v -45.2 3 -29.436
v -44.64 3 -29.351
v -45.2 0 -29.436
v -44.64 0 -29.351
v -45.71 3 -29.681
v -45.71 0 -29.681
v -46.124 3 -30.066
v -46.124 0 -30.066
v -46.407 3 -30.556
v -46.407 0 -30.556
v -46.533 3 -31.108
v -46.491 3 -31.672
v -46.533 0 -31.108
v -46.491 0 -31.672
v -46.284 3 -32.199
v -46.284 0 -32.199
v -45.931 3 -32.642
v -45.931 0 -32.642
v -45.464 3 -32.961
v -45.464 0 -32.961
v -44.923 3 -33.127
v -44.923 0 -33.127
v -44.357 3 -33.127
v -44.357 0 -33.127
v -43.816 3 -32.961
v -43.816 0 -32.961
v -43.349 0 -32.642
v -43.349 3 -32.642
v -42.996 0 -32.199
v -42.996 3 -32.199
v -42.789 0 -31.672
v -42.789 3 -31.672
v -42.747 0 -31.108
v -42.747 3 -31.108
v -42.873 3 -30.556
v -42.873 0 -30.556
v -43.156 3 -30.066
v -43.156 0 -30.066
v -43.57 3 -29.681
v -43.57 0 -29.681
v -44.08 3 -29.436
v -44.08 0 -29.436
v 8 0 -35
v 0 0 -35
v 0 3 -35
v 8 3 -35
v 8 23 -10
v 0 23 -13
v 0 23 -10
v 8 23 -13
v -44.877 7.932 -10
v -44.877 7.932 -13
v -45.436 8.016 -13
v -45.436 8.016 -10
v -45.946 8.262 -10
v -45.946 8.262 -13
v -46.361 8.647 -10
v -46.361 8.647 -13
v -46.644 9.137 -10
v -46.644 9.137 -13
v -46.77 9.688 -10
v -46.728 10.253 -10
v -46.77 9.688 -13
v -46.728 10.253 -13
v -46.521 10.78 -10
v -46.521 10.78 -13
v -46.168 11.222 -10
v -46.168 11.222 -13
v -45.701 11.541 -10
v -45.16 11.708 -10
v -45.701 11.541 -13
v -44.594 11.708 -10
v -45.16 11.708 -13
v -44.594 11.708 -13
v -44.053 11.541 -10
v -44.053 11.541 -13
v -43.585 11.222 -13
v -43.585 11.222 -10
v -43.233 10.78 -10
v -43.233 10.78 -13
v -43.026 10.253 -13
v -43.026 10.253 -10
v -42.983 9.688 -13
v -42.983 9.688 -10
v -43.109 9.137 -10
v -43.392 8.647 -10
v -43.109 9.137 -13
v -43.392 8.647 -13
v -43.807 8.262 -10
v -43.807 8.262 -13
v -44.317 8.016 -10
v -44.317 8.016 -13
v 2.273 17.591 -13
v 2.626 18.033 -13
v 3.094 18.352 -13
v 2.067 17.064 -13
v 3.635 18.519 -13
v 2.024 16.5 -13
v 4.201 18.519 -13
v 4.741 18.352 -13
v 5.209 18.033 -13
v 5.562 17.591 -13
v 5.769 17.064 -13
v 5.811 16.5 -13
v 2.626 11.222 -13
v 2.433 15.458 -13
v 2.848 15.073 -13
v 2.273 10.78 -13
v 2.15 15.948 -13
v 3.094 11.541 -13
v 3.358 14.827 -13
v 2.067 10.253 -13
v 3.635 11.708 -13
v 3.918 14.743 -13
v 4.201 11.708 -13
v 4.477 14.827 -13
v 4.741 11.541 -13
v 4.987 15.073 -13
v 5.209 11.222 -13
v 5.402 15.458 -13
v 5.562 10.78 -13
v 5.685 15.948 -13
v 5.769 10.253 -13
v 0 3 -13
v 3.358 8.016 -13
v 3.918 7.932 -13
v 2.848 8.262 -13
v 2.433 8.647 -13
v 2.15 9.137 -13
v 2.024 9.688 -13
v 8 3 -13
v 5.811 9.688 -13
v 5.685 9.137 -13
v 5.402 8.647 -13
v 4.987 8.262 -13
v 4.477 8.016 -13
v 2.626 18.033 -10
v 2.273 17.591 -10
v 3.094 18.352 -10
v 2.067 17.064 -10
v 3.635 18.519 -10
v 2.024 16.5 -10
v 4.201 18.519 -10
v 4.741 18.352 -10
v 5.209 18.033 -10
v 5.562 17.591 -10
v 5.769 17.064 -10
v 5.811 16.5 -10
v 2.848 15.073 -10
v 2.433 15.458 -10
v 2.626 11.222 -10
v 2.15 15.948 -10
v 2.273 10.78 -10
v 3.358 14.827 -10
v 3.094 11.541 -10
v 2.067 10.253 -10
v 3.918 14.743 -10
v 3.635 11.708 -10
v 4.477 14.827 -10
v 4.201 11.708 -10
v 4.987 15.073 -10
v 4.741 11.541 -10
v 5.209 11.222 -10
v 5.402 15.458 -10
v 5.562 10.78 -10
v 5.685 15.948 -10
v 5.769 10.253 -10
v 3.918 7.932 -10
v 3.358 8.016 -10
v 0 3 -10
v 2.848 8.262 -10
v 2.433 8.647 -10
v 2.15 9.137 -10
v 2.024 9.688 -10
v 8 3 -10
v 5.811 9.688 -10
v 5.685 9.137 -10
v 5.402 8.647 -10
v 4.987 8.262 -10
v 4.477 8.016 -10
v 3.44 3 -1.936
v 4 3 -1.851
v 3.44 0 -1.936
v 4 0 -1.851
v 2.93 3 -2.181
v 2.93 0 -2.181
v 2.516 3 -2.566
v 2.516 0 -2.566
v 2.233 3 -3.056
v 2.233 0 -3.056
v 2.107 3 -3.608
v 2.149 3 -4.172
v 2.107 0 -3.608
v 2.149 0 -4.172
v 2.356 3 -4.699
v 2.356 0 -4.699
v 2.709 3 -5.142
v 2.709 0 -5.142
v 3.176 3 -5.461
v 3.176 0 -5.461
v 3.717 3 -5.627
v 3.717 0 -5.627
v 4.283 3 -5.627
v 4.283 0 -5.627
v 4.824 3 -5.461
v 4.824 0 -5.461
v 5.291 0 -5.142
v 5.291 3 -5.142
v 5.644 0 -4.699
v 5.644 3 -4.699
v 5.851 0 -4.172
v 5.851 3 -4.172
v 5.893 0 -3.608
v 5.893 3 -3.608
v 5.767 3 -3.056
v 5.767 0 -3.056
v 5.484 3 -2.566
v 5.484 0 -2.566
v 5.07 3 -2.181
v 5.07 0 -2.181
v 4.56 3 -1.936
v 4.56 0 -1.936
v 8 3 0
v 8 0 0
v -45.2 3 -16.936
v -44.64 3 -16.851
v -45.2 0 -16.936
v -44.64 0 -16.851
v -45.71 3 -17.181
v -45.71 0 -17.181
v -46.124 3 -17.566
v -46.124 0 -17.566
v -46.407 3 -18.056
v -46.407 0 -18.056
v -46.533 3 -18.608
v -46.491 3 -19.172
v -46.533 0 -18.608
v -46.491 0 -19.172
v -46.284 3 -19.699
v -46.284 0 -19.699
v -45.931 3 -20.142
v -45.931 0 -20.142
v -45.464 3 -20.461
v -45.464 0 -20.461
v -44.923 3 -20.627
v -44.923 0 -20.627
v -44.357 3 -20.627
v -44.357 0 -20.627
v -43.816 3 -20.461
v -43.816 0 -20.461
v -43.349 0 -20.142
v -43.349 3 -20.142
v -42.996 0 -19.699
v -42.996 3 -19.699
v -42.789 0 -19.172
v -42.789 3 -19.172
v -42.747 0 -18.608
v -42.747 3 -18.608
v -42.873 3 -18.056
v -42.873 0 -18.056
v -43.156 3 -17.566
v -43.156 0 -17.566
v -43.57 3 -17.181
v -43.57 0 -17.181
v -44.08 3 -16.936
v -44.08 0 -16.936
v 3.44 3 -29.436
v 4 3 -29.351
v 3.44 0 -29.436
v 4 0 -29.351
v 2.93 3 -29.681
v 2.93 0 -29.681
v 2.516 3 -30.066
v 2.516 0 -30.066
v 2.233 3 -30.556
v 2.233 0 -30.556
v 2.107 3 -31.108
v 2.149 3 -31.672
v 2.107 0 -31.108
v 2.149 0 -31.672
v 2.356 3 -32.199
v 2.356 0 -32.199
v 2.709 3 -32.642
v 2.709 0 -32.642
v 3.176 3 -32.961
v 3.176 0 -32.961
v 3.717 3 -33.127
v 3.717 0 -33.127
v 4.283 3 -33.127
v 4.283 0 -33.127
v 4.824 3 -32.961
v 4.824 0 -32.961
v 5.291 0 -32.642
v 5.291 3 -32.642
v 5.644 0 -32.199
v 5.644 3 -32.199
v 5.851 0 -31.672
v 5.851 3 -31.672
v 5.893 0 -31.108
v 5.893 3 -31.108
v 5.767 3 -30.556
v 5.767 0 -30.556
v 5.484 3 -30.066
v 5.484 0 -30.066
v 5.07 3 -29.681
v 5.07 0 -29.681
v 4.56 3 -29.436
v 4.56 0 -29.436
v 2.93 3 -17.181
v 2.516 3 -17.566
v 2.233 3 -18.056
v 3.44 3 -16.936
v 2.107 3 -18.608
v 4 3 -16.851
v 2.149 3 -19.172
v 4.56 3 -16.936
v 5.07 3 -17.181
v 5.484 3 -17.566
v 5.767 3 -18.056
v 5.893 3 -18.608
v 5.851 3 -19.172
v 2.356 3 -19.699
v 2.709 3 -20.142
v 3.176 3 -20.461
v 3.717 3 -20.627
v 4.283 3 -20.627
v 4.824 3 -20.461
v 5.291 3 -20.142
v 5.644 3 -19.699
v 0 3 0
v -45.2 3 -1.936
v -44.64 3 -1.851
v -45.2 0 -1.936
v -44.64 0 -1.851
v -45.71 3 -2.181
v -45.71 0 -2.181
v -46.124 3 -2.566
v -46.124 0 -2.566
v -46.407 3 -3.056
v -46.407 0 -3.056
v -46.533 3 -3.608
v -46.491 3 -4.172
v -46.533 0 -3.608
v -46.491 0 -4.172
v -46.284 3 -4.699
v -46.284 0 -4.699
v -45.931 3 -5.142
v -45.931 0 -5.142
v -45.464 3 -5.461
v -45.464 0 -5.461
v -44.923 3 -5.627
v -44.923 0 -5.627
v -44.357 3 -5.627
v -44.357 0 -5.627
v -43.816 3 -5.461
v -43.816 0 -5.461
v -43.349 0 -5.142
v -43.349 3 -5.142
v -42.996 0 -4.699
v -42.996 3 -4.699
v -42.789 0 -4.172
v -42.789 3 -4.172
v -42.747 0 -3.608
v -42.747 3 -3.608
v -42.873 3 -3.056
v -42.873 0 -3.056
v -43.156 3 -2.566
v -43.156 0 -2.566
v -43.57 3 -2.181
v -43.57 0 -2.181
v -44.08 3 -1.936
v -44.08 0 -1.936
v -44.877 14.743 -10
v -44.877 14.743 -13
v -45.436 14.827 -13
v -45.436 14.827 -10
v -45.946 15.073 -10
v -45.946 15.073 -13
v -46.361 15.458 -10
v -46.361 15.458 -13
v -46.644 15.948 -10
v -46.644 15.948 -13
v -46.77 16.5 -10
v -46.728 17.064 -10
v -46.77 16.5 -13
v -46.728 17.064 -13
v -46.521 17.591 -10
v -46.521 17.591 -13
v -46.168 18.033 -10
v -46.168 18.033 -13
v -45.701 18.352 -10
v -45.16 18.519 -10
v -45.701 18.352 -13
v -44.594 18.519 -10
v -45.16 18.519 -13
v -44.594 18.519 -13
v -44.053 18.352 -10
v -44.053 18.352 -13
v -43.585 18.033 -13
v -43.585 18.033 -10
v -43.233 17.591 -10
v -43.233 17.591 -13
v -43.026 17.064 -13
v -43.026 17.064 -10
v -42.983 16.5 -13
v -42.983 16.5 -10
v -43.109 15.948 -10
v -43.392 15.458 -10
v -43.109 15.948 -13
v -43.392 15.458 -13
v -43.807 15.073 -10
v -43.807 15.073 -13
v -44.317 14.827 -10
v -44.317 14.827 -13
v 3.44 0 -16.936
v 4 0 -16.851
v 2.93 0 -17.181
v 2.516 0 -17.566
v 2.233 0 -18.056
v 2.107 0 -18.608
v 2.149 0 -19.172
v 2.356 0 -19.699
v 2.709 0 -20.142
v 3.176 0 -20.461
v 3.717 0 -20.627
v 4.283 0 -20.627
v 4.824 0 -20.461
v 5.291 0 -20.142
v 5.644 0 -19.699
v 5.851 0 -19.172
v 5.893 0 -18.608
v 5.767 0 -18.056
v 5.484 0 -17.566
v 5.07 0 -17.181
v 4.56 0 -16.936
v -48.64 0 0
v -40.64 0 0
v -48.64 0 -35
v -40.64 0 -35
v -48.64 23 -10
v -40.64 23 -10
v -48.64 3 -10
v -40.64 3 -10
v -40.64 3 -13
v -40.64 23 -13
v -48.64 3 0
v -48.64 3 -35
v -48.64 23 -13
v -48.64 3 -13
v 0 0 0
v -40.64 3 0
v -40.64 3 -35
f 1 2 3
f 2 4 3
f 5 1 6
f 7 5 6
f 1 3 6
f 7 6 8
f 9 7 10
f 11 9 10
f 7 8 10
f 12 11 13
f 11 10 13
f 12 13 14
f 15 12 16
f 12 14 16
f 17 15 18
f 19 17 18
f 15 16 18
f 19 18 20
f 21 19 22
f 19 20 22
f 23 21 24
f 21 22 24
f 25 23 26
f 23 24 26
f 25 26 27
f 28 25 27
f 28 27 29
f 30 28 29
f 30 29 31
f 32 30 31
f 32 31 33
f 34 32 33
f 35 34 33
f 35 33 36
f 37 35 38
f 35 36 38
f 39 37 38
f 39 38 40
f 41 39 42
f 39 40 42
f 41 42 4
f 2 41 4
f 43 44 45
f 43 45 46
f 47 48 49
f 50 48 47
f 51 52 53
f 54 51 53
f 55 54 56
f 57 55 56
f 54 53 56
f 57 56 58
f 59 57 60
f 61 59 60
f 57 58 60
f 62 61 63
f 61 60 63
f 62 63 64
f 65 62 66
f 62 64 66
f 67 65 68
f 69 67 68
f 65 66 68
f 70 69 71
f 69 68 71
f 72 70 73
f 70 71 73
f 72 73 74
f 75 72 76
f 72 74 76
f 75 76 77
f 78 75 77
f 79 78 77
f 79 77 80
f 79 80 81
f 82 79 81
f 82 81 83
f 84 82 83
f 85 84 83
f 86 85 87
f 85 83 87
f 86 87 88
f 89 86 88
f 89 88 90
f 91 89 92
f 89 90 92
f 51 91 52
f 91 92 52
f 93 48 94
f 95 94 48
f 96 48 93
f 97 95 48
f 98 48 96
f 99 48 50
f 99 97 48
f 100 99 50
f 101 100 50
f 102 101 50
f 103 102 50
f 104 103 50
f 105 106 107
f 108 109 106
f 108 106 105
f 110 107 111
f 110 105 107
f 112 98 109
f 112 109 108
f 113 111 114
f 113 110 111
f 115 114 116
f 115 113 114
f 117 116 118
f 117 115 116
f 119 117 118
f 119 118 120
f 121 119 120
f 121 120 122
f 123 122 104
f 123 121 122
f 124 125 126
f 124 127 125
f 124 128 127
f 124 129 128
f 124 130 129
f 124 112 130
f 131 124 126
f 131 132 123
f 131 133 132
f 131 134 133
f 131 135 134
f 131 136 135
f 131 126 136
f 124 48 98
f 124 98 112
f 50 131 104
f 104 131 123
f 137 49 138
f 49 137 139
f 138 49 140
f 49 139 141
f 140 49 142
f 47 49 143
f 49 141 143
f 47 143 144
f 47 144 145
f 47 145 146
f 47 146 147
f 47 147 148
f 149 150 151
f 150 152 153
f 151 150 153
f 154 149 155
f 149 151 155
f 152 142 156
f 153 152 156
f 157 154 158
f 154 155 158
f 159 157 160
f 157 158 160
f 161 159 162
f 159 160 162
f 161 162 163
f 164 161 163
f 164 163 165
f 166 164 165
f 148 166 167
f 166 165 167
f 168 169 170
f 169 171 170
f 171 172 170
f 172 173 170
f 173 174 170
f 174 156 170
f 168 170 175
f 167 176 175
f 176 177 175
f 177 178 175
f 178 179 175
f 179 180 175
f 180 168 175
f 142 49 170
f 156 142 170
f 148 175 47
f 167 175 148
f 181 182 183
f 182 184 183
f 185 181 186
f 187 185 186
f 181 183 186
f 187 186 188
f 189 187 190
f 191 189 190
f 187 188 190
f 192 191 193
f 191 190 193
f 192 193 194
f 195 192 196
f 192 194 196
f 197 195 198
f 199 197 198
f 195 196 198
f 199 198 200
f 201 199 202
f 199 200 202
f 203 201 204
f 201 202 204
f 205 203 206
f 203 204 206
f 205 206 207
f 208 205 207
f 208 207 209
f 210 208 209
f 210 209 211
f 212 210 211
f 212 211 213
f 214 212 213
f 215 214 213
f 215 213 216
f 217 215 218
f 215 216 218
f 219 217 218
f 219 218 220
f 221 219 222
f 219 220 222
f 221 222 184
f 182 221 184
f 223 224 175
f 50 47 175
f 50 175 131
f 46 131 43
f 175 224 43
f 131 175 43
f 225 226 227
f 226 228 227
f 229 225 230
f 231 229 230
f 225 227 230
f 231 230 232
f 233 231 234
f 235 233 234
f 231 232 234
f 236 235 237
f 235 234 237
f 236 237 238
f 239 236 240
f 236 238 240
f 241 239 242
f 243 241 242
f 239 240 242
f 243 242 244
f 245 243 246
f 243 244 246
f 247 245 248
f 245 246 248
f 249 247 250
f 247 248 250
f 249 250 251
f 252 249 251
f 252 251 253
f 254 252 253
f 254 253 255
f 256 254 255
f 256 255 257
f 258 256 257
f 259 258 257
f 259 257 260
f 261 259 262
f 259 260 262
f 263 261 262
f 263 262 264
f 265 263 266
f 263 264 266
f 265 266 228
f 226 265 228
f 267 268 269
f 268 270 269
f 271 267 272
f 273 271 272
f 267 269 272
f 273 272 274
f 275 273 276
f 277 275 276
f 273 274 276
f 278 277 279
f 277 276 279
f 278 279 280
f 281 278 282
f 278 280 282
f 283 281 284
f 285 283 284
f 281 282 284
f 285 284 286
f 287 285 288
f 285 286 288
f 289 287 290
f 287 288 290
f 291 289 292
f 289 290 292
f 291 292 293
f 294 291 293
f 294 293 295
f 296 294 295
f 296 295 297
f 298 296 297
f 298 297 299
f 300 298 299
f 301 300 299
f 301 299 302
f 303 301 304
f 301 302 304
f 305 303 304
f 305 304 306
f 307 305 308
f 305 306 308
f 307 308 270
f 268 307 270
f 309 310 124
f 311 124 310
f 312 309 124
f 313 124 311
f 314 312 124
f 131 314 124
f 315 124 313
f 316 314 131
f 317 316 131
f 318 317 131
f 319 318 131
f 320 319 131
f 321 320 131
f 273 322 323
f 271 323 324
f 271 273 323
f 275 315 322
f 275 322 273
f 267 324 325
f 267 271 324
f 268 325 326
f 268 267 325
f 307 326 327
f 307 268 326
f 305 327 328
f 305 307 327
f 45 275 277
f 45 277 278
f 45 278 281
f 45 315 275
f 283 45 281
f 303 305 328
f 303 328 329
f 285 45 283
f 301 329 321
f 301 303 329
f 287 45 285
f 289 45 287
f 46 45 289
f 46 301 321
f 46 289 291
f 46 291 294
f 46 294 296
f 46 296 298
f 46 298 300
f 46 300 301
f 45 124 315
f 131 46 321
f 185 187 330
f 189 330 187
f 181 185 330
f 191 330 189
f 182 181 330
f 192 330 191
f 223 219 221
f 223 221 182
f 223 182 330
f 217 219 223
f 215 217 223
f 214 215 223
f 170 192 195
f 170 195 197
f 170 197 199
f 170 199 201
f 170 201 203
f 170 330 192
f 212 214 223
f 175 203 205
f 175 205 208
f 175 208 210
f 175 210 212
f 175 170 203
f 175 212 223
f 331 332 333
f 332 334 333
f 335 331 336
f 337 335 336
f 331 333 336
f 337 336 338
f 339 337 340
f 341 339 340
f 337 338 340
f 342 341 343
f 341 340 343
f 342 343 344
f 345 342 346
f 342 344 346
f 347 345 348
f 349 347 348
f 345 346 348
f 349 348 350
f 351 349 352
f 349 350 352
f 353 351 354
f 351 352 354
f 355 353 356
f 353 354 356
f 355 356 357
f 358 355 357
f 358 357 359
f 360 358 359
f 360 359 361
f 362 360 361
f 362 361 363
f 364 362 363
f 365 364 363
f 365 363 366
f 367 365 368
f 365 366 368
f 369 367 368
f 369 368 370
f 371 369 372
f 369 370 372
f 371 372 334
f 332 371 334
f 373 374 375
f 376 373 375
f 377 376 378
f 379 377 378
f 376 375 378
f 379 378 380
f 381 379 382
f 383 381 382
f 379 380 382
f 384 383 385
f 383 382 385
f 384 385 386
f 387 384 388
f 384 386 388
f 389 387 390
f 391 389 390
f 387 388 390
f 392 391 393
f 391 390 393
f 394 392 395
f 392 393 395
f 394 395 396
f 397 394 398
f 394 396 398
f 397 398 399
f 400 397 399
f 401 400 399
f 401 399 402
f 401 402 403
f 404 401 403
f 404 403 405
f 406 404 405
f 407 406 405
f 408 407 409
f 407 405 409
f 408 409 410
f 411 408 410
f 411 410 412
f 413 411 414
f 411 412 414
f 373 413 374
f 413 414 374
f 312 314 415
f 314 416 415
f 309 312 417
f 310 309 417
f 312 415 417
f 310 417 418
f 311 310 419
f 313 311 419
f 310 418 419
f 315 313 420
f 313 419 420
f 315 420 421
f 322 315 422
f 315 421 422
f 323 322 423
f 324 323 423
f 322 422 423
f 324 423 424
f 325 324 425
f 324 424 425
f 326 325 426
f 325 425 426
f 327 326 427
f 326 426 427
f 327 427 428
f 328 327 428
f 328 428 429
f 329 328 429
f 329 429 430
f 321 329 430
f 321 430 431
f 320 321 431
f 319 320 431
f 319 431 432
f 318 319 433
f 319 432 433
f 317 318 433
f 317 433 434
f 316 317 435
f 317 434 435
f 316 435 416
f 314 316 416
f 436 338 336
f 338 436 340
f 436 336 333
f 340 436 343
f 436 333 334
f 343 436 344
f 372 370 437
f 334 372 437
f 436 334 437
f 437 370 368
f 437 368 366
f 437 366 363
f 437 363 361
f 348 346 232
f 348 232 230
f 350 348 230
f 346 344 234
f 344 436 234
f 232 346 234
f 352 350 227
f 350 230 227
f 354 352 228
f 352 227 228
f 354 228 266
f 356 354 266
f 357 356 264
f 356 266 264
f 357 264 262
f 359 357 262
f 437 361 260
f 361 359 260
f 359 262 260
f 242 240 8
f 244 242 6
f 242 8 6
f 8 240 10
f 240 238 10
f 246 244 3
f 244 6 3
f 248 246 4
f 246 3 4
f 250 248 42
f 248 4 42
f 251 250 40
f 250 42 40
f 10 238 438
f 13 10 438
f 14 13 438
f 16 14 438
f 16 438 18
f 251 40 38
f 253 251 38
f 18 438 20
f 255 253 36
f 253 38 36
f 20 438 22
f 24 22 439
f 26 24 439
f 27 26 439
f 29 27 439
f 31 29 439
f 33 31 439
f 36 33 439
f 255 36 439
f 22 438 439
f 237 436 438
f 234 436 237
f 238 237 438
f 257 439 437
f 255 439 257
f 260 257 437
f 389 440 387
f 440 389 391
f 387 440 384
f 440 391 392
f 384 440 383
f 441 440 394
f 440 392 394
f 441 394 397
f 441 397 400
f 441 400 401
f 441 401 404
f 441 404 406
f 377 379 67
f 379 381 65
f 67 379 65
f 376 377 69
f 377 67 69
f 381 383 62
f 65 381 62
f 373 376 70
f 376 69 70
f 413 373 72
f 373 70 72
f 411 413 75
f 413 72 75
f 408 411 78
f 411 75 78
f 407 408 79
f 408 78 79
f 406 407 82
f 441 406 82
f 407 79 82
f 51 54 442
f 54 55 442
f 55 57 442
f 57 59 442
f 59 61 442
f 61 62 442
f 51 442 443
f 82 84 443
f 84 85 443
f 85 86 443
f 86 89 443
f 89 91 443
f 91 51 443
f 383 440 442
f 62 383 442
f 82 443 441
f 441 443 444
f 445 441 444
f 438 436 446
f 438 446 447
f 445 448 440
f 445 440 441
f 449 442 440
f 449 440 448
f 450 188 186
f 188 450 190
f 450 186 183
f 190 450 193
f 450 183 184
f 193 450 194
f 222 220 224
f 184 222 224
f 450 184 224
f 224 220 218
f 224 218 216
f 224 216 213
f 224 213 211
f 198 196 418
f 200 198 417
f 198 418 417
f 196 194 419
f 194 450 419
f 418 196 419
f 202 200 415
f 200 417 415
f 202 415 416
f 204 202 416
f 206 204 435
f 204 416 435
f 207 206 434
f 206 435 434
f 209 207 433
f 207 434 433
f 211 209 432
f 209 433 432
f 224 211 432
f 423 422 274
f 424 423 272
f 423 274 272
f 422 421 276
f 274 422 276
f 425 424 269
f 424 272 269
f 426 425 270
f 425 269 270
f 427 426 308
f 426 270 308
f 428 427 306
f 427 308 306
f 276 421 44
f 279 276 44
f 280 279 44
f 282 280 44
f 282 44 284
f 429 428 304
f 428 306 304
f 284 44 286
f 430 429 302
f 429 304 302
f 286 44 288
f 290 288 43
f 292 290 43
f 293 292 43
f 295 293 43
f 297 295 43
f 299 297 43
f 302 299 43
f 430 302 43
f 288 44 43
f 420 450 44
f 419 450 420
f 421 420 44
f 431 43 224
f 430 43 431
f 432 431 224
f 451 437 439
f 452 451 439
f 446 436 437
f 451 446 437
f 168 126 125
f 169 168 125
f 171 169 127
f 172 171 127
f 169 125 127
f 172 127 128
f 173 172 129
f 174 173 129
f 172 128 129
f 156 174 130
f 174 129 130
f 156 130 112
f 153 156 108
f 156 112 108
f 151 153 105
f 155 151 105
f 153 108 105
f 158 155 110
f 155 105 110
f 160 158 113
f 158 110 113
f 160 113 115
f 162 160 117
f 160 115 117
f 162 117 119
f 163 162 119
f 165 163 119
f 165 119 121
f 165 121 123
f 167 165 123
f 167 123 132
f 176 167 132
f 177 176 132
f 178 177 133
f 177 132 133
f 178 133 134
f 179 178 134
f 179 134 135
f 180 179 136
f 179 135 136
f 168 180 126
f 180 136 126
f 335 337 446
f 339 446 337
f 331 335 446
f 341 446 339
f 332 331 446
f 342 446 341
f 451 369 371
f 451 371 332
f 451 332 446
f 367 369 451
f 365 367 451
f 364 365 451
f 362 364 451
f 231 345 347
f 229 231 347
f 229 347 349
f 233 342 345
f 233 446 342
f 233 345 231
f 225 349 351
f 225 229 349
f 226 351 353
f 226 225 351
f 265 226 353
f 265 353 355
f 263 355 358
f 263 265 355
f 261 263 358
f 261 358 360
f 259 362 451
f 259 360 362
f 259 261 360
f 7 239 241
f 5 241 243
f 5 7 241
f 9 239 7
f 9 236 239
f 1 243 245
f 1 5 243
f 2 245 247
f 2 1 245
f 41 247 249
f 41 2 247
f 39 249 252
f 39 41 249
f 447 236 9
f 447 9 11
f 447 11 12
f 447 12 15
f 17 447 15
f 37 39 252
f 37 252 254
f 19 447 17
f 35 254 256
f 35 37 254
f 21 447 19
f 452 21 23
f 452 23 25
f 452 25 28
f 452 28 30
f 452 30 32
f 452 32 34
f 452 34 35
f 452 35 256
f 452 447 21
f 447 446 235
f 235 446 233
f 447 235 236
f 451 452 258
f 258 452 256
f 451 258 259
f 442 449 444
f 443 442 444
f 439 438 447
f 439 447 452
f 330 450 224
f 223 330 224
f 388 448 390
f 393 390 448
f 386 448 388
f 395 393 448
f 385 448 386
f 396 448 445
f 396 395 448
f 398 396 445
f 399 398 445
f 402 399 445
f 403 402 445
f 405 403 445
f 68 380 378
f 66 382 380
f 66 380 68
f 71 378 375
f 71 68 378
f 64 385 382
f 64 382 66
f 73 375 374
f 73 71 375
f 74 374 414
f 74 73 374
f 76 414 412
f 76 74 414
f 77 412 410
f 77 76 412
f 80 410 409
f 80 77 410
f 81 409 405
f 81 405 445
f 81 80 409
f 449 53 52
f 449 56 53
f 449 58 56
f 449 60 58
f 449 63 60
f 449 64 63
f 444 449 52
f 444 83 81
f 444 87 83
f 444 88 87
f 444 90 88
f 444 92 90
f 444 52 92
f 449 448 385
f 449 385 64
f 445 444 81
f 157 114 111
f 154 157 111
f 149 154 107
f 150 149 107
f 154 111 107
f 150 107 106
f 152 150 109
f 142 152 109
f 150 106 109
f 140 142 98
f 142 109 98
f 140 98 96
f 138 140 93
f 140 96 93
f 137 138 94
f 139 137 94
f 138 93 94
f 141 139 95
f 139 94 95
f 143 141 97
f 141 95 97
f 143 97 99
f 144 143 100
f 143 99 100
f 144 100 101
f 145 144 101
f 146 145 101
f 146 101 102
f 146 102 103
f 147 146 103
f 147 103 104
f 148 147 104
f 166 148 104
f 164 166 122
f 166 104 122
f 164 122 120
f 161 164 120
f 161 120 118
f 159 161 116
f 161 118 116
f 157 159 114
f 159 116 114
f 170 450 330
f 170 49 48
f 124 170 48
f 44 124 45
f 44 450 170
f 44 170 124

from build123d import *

# Parameters (mm, degrees)
SKETCH1_W                      = 8
SKETCH1_H                      = 35
BOSS_EXTRUDE1_DEPTH            = 3
BOSS_EXTRUDE1_2_DEPTH          = 3
SKETCH2_W                      = 8
SKETCH2_H                      = 3
BOSS_EXTRUDE2_DEPTH            = 20
SKETCH4_W                      = 1.89865
SKETCH4_H                      = 25
F_6_CLEARANCE_HOLE1_AT_2_COUNT = 2
F_6_CLEARANCE_HOLE1_AT_2_PITCH = 6.811261247
F_6_CLEARANCE_HOLE1_AT_3_COUNT = 2
F_6_CLEARANCE_HOLE1_AT_3_PITCH = 48.794466348
F_6_CLEARANCE_HOLE1_AT_4_COUNT = 2
F_6_CLEARANCE_HOLE1_AT_4_PITCH = 49.267567689
SKETCH6_W                      = 1.89865
SKETCH6_H                      = 3
F_6_CLEARANCE_HOLE2_AT_2_COUNT = 2
F_6_CLEARANCE_HOLE2_AT_2_PITCH = 12.5
F_6_CLEARANCE_HOLE2_AT_3_COUNT = 2
F_6_CLEARANCE_HOLE2_AT_3_PITCH = 27.5
F_6_CLEARANCE_HOLE2_AT_4_COUNT = 2
F_6_CLEARANCE_HOLE2_AT_4_PITCH = 48.64
F_6_CLEARANCE_HOLE2_AT_5_COUNT = 2
F_6_CLEARANCE_HOLE2_AT_5_PITCH = 50.220509754
F_6_CLEARANCE_HOLE2_AT_6_COUNT = 2
F_6_CLEARANCE_HOLE2_AT_6_PITCH = 55.875751449


with BuildPart() as part:
    # Sketch1 → Boss-Extrude1 (new body)
    with BuildSketch(Plane(origin=(0, 0, 0), x_dir=(1, 0, 0), z_dir=(0, 1, 0))):
        with Locations((4, 17.5)):
            Rectangle(SKETCH1_W, SKETCH1_H)
    extrude(amount=BOSS_EXTRUDE1_DEPTH)

    # Sketch2 → Boss-Extrude2 (add)
    with BuildSketch(Plane(origin=(0, 3, 0), x_dir=(1, 0, 0), z_dir=(0, 1, 0))):
        with Locations((4, 11.5)):
            Rectangle(SKETCH2_W, SKETCH2_H)
        with Locations((-44.64, 11.5)):
            Rectangle(SKETCH2_W, SKETCH2_H)
    extrude(amount=BOSS_EXTRUDE2_DEPTH)


with BuildPart() as body_2:
    # Sketch1 → Boss-Extrude1 2 (new body)
    with BuildSketch(Plane(origin=(0, 0, 0), x_dir=(1, 0, 0), z_dir=(0, 1, 0))):
        with Locations((-44.64, 17.5)):
            Rectangle(SKETCH1_W, SKETCH1_H)
    extrude(amount=BOSS_EXTRUDE1_2_DEPTH)

    # Sketch6 → #6 Clearance Hole2 (revolve, cut)
    with BuildSketch(Plane(origin=(-44.64, 3, -31.25), x_dir=(0, 0, 1), z_dir=(1, 0, 0))):
        with Locations((0.949325, 1.5)):
            Rectangle(SKETCH6_W, SKETCH6_H)
    f_6_clearance_hole2 = revolve(axis=Axis((-44.64, 9.35, -31.25), (0, -1, 0)), mode=Mode.SUBTRACT)

    # #6 Clearance Hole2 at 2: #6 Clearance Hole2 ×2
    with Locations(*[(0, 0, i * F_6_CLEARANCE_HOLE2_AT_2_PITCH) for i in range(1, F_6_CLEARANCE_HOLE2_AT_2_COUNT)]):
        add(f_6_clearance_hole2, mode=Mode.SUBTRACT)

    # #6 Clearance Hole2 at 3: #6 Clearance Hole2 ×2
    with Locations(*[(0, 0, i * F_6_CLEARANCE_HOLE2_AT_3_PITCH) for i in range(1, F_6_CLEARANCE_HOLE2_AT_3_COUNT)]):
        add(f_6_clearance_hole2, mode=Mode.SUBTRACT)


with BuildPart() as boss_extrude2_piece_1:
    # of the separate pieces the step leaves, piece 1, a body of its own (boss_extrude2_pieces)
    add(part.part.solids().sort_by_distance((0, 0, -35))[0])


with BuildPart() as boss_extrude2_piece_2:
    # of the separate pieces the step leaves, piece 2, a body of its own (boss_extrude2_pieces)
    add(part.part.solids().sort_by_distance((-48.64, 3, -13))[0])

    # Sketch4 → #6 Clearance Hole1 (revolve, cut)
    with BuildSketch(Plane(origin=(-44.876822142, 16.641573731, -10), x_dir=(0, -1, 0), z_dir=(1, 0, 0))):
        with Locations((0.949325, 12.5)):
            Rectangle(SKETCH4_W, SKETCH4_H)
    f_6_clearance_hole1 = revolve(axis=Axis((-44.876822142, 16.641573731, -3.65), (0, 0, -1)), mode=Mode.SUBTRACT)

    # #6 Clearance Hole1 at 2: #6 Clearance Hole1 ×2
    with Locations(*[(0, -i * F_6_CLEARANCE_HOLE1_AT_2_PITCH, 0) for i in range(1, F_6_CLEARANCE_HOLE1_AT_2_COUNT)]):
        add(f_6_clearance_hole1, mode=Mode.SUBTRACT)


with BuildPart() as boss_extrude2_piece_1_1:
    add(boss_extrude2_piece_1.part)

    # #6 Clearance Hole1 at 3: #6 Clearance Hole1 ×2
    with Locations(*[(i * F_6_CLEARANCE_HOLE1_AT_3_PITCH, 0, 0) for i in range(1, F_6_CLEARANCE_HOLE1_AT_3_COUNT)]):
        add(f_6_clearance_hole1, mode=Mode.SUBTRACT)

    # #6 Clearance Hole1 at 4: #6 Clearance Hole1 ×2
    with Locations(*[Vector(0.99039730672902, -0.13825040623413515, 0) * (i * F_6_CLEARANCE_HOLE1_AT_4_PITCH) for i in range(1, F_6_CLEARANCE_HOLE1_AT_4_COUNT)]):
        add(f_6_clearance_hole1, mode=Mode.SUBTRACT)

    # #6 Clearance Hole2 at 4: #6 Clearance Hole2 ×2
    with Locations(*[(i * F_6_CLEARANCE_HOLE2_AT_4_PITCH, 0, 0) for i in range(1, F_6_CLEARANCE_HOLE2_AT_4_COUNT)]):
        add(f_6_clearance_hole2, mode=Mode.SUBTRACT)

    # #6 Clearance Hole2 at 5: #6 Clearance Hole2 ×2
    with Locations(*[Vector(0.9685285999244415, 0, 0.2489022923325559) * (i * F_6_CLEARANCE_HOLE2_AT_5_PITCH) for i in range(1, F_6_CLEARANCE_HOLE2_AT_5_COUNT)]):
        add(f_6_clearance_hole2, mode=Mode.SUBTRACT)

    # #6 Clearance Hole2 at 6: #6 Clearance Hole2 ×2
    with Locations(*[Vector(0.8705028342092377, 0, 0.4921634033872129) * (i * F_6_CLEARANCE_HOLE2_AT_6_PITCH) for i in range(1, F_6_CLEARANCE_HOLE2_AT_6_COUNT)]):
        add(f_6_clearance_hole2, mode=Mode.SUBTRACT)


solid = Compound([body_2.part, boss_extrude2_piece_2.part, boss_extrude2_piece_1_1.part])
